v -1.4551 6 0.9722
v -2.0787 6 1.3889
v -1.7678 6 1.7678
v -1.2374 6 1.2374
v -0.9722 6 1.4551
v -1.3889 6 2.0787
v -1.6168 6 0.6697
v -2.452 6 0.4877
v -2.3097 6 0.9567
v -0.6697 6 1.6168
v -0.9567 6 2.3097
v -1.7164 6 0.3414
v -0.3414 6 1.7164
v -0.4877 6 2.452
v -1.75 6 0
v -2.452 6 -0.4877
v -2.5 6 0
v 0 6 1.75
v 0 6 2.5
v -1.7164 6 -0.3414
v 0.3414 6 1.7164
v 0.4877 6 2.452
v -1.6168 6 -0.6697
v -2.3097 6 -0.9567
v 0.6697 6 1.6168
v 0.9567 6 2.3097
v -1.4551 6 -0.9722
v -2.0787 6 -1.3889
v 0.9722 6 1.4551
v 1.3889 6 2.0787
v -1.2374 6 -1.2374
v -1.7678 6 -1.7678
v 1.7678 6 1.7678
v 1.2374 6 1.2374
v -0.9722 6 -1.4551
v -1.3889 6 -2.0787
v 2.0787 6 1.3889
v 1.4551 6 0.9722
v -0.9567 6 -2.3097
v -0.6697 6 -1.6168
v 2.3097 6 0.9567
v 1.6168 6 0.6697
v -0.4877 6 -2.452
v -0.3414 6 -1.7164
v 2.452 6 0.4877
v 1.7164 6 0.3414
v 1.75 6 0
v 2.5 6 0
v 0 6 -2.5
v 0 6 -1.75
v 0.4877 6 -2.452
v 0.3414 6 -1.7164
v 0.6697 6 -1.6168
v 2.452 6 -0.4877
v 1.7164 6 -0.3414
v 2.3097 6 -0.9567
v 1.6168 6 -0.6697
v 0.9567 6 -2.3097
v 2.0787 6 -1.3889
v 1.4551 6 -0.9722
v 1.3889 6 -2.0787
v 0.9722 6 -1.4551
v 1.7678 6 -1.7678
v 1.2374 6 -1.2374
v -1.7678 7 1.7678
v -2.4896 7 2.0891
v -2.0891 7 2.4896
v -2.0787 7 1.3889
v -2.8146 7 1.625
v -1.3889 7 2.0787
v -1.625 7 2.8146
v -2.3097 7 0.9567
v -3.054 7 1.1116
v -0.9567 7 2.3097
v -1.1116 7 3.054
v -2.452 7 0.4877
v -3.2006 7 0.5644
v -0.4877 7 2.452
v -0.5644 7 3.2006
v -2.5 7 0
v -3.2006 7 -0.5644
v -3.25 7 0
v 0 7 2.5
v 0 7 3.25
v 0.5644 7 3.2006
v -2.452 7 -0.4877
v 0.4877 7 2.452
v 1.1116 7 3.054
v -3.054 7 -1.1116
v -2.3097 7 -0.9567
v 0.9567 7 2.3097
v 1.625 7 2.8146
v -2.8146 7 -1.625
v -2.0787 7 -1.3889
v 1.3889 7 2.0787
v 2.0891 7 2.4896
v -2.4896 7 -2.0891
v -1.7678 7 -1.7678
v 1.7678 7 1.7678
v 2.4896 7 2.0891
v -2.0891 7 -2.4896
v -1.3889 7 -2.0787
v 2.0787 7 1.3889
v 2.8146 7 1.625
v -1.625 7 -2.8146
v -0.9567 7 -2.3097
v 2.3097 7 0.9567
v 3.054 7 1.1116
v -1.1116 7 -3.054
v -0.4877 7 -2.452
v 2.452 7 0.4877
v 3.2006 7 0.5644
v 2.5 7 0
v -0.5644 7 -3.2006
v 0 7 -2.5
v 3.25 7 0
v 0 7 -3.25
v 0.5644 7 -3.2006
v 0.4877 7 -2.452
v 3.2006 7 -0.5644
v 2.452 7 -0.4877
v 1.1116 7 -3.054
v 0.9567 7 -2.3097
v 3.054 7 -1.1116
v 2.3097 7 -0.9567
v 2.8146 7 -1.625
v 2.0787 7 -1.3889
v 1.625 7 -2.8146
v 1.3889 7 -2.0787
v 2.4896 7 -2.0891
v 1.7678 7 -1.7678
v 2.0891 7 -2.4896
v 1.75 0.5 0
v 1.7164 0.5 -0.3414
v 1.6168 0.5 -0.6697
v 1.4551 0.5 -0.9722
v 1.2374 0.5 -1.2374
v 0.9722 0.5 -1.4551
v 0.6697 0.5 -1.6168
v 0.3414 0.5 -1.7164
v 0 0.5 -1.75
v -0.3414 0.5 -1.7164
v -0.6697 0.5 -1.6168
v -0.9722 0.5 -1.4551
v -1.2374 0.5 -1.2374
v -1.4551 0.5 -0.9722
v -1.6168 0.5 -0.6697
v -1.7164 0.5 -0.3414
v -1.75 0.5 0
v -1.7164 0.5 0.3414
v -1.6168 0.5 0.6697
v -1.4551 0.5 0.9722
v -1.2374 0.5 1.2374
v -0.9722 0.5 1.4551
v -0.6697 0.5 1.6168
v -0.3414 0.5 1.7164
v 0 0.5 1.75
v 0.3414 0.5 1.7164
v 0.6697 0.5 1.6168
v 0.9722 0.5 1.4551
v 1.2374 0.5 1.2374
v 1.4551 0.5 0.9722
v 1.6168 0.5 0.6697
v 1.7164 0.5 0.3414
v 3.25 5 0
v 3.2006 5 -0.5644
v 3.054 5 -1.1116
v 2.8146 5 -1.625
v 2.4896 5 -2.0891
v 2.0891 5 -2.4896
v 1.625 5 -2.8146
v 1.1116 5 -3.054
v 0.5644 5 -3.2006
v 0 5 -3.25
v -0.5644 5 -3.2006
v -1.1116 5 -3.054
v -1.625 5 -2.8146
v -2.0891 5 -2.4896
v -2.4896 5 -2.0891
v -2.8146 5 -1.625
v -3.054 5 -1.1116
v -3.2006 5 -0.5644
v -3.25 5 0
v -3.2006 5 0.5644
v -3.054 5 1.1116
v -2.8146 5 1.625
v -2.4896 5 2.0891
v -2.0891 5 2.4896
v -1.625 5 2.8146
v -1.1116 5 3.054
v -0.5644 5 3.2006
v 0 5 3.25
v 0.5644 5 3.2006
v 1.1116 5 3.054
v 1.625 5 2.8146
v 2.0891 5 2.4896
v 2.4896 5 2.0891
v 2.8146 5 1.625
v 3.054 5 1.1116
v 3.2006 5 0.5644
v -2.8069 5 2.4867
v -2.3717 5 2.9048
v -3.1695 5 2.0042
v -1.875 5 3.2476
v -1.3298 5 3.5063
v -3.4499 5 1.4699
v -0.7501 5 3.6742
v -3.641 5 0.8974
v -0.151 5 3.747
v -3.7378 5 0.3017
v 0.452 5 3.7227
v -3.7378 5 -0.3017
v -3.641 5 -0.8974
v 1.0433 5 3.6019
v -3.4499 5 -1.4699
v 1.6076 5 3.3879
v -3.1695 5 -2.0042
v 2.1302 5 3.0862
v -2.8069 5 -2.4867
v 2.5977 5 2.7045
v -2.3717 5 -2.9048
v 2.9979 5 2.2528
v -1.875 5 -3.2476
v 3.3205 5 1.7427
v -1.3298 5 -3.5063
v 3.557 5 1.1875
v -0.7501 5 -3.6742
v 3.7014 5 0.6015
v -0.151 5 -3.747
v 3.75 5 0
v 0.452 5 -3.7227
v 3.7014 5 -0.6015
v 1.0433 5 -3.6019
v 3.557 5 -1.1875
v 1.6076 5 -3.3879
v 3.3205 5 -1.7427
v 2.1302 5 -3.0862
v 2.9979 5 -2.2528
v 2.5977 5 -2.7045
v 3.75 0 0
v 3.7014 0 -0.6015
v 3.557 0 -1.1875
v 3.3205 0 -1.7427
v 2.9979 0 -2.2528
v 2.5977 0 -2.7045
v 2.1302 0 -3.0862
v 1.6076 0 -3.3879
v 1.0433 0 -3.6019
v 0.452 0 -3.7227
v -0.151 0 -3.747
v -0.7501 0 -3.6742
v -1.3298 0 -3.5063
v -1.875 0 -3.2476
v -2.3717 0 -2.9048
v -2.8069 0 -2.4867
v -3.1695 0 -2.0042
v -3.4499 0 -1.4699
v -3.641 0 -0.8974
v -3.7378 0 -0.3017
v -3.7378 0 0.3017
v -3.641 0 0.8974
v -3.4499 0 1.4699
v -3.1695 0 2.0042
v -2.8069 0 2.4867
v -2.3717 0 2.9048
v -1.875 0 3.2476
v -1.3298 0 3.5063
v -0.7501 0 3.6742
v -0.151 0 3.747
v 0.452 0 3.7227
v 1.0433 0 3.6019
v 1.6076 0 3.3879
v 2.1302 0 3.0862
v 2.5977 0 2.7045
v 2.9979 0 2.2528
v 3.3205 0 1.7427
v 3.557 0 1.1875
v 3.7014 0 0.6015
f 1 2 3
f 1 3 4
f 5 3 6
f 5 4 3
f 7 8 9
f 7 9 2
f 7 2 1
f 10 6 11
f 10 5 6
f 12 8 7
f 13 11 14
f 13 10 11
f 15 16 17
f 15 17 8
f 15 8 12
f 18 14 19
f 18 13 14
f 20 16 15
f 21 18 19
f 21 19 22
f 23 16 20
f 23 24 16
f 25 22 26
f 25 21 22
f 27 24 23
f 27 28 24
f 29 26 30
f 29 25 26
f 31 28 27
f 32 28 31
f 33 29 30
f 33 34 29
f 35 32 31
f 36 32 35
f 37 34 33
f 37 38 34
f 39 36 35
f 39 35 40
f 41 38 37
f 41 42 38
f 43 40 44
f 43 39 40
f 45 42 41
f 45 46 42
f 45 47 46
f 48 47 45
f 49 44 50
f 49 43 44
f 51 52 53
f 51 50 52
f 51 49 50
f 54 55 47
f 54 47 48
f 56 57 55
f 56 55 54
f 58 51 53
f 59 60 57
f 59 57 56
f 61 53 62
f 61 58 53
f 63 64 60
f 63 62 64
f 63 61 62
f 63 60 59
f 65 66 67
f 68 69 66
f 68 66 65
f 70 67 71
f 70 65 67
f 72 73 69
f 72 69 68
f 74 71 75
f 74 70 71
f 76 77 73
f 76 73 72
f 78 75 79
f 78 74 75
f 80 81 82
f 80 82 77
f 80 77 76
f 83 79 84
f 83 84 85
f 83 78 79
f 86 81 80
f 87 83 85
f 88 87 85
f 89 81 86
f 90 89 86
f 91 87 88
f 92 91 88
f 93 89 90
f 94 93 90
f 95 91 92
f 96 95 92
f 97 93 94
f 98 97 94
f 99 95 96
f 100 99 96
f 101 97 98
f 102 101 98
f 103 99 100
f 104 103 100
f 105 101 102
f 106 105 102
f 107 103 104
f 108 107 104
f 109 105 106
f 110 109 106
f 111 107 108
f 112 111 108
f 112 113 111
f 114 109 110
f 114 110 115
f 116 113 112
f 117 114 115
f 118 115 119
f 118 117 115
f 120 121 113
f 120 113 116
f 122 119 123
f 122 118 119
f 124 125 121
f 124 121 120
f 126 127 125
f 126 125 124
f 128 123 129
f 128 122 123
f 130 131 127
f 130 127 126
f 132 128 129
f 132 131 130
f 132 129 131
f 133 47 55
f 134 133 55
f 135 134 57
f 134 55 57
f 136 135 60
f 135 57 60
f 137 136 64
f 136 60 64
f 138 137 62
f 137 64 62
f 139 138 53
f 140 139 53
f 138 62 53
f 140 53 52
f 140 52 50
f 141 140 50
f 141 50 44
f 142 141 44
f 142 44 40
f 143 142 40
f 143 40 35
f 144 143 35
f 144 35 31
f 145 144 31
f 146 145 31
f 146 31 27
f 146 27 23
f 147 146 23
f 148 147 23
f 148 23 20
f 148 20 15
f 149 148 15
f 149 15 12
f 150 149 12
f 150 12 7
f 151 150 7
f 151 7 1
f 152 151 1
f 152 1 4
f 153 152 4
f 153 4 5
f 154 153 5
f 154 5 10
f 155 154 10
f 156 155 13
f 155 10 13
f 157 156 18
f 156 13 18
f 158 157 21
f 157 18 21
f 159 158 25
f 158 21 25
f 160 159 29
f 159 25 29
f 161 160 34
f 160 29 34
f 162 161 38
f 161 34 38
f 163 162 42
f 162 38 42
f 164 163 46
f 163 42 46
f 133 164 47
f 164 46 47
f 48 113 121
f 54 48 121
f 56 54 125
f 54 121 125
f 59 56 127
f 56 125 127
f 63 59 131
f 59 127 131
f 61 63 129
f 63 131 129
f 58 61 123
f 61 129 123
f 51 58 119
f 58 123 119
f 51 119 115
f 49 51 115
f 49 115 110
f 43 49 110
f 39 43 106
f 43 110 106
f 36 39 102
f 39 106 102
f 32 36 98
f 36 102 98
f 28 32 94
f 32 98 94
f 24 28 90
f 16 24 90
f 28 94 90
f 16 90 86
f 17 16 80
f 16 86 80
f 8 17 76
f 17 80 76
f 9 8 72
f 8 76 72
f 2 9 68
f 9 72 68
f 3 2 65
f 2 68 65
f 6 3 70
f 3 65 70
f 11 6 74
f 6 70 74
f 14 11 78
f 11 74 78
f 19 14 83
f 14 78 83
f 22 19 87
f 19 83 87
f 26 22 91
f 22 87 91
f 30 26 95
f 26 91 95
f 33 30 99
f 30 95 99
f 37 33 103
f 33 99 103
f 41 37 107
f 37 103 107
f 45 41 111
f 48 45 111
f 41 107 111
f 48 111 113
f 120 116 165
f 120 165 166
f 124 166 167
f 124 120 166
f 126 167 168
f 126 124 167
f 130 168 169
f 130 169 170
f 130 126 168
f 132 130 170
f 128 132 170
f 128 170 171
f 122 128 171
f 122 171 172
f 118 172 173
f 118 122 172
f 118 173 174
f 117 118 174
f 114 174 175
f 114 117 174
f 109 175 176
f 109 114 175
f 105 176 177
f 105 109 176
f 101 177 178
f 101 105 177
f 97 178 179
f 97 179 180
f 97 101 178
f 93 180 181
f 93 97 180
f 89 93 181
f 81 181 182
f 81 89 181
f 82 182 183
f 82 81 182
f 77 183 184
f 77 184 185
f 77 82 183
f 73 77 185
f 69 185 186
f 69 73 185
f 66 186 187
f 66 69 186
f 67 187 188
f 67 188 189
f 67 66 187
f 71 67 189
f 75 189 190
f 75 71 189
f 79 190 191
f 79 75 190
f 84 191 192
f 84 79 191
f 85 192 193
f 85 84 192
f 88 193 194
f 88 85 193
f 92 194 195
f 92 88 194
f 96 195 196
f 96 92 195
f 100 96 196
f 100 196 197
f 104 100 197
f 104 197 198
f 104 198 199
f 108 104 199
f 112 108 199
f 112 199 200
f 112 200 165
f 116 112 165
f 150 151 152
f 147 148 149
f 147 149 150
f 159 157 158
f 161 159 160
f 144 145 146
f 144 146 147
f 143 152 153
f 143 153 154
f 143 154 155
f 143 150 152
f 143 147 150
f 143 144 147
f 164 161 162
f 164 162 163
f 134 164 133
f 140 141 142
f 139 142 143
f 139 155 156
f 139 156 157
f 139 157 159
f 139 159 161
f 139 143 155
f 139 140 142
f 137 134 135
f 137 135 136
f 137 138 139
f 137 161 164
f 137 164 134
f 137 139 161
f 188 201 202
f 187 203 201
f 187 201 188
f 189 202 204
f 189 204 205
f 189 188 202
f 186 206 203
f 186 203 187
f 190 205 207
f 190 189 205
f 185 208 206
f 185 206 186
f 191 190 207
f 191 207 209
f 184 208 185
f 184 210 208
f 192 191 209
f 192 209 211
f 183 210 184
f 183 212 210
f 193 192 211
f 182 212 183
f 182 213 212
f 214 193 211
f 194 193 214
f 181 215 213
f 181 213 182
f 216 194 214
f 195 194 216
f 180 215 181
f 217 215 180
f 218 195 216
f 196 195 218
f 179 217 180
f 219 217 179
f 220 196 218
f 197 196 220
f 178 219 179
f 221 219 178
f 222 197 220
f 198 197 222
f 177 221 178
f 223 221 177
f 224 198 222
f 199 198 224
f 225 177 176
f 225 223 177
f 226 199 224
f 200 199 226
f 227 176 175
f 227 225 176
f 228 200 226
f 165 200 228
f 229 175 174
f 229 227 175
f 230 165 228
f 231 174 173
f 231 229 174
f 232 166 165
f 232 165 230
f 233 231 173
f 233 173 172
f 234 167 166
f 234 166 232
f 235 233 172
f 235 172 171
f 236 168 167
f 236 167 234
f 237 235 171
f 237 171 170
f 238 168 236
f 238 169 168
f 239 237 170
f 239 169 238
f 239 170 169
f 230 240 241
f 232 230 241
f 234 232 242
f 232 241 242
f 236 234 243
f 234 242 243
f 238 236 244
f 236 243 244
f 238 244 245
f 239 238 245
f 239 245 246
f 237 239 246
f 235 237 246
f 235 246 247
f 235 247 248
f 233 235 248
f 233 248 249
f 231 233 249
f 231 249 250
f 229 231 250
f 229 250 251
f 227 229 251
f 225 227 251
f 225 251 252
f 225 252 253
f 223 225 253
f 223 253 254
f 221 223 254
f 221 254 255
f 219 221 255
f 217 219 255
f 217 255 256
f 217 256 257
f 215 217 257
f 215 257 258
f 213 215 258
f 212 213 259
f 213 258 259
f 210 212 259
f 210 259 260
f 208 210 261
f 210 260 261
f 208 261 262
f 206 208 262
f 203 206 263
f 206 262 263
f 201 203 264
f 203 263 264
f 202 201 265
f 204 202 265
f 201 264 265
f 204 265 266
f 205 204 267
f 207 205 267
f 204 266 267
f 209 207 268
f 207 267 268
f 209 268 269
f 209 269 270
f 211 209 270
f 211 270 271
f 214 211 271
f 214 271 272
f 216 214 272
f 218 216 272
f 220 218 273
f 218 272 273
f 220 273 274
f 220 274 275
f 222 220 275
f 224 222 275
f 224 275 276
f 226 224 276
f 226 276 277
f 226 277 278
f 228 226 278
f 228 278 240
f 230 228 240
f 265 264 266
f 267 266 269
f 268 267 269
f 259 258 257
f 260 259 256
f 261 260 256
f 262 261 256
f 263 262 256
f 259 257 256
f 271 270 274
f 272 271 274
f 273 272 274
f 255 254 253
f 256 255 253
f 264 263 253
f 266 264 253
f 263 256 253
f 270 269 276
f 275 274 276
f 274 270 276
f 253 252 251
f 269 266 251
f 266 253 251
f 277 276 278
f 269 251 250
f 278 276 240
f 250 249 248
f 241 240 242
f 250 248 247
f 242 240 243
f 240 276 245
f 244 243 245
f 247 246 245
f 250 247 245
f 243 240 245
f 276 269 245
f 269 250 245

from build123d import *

# Parameters (mm, degrees)
SKETCH1_R           = 3.75
BOSS_EXTRUDE1_DEPTH = 7
SKETCH3_R           = 3.75
SKETCH3_R_2         = 3.25
CUT_EXTRUDE1_DEPTH  = 2
SKETCH4_R           = 1.75
CUT_EXTRUDE2_DEPTH  = 6.5
SKETCH5_R           = 2.5
CUT_EXTRUDE4_DEPTH  = 1


with BuildPart() as part:
    # Sketch1 → Boss-Extrude1 (new body)
    with BuildSketch(Plane(origin=(0, 0, 0), x_dir=(1, 0, 0), z_dir=(0, 1, 0))):
        Circle(SKETCH1_R)
    extrude(amount=BOSS_EXTRUDE1_DEPTH)

    # Sketch3 → Cut-Extrude1 (cut)
    with BuildSketch(Plane(origin=(0, 7, 0), x_dir=(1, 0, 0), z_dir=(0, 1, 0))):
        Circle(SKETCH3_R)
        Circle(SKETCH3_R_2, mode=Mode.SUBTRACT)
    extrude(amount=-CUT_EXTRUDE1_DEPTH, mode=Mode.SUBTRACT)

    # Sketch4 → Cut-Extrude2 (cut)
    with BuildSketch(Plane(origin=(0, 7, 0), x_dir=(1, 0, 0), z_dir=(0, 1, 0))):
        Circle(SKETCH4_R)
    extrude(amount=-CUT_EXTRUDE2_DEPTH, mode=Mode.SUBTRACT)

    # Sketch5 → Cut-Extrude4 (cut)
    with BuildSketch(Plane(origin=(0, 7, 0), x_dir=(1, 0, 0), z_dir=(0, 1, 0))):
        Circle(SKETCH5_R)
    extrude(amount=-CUT_EXTRUDE4_DEPTH, mode=Mode.SUBTRACT)


solid = part.part
